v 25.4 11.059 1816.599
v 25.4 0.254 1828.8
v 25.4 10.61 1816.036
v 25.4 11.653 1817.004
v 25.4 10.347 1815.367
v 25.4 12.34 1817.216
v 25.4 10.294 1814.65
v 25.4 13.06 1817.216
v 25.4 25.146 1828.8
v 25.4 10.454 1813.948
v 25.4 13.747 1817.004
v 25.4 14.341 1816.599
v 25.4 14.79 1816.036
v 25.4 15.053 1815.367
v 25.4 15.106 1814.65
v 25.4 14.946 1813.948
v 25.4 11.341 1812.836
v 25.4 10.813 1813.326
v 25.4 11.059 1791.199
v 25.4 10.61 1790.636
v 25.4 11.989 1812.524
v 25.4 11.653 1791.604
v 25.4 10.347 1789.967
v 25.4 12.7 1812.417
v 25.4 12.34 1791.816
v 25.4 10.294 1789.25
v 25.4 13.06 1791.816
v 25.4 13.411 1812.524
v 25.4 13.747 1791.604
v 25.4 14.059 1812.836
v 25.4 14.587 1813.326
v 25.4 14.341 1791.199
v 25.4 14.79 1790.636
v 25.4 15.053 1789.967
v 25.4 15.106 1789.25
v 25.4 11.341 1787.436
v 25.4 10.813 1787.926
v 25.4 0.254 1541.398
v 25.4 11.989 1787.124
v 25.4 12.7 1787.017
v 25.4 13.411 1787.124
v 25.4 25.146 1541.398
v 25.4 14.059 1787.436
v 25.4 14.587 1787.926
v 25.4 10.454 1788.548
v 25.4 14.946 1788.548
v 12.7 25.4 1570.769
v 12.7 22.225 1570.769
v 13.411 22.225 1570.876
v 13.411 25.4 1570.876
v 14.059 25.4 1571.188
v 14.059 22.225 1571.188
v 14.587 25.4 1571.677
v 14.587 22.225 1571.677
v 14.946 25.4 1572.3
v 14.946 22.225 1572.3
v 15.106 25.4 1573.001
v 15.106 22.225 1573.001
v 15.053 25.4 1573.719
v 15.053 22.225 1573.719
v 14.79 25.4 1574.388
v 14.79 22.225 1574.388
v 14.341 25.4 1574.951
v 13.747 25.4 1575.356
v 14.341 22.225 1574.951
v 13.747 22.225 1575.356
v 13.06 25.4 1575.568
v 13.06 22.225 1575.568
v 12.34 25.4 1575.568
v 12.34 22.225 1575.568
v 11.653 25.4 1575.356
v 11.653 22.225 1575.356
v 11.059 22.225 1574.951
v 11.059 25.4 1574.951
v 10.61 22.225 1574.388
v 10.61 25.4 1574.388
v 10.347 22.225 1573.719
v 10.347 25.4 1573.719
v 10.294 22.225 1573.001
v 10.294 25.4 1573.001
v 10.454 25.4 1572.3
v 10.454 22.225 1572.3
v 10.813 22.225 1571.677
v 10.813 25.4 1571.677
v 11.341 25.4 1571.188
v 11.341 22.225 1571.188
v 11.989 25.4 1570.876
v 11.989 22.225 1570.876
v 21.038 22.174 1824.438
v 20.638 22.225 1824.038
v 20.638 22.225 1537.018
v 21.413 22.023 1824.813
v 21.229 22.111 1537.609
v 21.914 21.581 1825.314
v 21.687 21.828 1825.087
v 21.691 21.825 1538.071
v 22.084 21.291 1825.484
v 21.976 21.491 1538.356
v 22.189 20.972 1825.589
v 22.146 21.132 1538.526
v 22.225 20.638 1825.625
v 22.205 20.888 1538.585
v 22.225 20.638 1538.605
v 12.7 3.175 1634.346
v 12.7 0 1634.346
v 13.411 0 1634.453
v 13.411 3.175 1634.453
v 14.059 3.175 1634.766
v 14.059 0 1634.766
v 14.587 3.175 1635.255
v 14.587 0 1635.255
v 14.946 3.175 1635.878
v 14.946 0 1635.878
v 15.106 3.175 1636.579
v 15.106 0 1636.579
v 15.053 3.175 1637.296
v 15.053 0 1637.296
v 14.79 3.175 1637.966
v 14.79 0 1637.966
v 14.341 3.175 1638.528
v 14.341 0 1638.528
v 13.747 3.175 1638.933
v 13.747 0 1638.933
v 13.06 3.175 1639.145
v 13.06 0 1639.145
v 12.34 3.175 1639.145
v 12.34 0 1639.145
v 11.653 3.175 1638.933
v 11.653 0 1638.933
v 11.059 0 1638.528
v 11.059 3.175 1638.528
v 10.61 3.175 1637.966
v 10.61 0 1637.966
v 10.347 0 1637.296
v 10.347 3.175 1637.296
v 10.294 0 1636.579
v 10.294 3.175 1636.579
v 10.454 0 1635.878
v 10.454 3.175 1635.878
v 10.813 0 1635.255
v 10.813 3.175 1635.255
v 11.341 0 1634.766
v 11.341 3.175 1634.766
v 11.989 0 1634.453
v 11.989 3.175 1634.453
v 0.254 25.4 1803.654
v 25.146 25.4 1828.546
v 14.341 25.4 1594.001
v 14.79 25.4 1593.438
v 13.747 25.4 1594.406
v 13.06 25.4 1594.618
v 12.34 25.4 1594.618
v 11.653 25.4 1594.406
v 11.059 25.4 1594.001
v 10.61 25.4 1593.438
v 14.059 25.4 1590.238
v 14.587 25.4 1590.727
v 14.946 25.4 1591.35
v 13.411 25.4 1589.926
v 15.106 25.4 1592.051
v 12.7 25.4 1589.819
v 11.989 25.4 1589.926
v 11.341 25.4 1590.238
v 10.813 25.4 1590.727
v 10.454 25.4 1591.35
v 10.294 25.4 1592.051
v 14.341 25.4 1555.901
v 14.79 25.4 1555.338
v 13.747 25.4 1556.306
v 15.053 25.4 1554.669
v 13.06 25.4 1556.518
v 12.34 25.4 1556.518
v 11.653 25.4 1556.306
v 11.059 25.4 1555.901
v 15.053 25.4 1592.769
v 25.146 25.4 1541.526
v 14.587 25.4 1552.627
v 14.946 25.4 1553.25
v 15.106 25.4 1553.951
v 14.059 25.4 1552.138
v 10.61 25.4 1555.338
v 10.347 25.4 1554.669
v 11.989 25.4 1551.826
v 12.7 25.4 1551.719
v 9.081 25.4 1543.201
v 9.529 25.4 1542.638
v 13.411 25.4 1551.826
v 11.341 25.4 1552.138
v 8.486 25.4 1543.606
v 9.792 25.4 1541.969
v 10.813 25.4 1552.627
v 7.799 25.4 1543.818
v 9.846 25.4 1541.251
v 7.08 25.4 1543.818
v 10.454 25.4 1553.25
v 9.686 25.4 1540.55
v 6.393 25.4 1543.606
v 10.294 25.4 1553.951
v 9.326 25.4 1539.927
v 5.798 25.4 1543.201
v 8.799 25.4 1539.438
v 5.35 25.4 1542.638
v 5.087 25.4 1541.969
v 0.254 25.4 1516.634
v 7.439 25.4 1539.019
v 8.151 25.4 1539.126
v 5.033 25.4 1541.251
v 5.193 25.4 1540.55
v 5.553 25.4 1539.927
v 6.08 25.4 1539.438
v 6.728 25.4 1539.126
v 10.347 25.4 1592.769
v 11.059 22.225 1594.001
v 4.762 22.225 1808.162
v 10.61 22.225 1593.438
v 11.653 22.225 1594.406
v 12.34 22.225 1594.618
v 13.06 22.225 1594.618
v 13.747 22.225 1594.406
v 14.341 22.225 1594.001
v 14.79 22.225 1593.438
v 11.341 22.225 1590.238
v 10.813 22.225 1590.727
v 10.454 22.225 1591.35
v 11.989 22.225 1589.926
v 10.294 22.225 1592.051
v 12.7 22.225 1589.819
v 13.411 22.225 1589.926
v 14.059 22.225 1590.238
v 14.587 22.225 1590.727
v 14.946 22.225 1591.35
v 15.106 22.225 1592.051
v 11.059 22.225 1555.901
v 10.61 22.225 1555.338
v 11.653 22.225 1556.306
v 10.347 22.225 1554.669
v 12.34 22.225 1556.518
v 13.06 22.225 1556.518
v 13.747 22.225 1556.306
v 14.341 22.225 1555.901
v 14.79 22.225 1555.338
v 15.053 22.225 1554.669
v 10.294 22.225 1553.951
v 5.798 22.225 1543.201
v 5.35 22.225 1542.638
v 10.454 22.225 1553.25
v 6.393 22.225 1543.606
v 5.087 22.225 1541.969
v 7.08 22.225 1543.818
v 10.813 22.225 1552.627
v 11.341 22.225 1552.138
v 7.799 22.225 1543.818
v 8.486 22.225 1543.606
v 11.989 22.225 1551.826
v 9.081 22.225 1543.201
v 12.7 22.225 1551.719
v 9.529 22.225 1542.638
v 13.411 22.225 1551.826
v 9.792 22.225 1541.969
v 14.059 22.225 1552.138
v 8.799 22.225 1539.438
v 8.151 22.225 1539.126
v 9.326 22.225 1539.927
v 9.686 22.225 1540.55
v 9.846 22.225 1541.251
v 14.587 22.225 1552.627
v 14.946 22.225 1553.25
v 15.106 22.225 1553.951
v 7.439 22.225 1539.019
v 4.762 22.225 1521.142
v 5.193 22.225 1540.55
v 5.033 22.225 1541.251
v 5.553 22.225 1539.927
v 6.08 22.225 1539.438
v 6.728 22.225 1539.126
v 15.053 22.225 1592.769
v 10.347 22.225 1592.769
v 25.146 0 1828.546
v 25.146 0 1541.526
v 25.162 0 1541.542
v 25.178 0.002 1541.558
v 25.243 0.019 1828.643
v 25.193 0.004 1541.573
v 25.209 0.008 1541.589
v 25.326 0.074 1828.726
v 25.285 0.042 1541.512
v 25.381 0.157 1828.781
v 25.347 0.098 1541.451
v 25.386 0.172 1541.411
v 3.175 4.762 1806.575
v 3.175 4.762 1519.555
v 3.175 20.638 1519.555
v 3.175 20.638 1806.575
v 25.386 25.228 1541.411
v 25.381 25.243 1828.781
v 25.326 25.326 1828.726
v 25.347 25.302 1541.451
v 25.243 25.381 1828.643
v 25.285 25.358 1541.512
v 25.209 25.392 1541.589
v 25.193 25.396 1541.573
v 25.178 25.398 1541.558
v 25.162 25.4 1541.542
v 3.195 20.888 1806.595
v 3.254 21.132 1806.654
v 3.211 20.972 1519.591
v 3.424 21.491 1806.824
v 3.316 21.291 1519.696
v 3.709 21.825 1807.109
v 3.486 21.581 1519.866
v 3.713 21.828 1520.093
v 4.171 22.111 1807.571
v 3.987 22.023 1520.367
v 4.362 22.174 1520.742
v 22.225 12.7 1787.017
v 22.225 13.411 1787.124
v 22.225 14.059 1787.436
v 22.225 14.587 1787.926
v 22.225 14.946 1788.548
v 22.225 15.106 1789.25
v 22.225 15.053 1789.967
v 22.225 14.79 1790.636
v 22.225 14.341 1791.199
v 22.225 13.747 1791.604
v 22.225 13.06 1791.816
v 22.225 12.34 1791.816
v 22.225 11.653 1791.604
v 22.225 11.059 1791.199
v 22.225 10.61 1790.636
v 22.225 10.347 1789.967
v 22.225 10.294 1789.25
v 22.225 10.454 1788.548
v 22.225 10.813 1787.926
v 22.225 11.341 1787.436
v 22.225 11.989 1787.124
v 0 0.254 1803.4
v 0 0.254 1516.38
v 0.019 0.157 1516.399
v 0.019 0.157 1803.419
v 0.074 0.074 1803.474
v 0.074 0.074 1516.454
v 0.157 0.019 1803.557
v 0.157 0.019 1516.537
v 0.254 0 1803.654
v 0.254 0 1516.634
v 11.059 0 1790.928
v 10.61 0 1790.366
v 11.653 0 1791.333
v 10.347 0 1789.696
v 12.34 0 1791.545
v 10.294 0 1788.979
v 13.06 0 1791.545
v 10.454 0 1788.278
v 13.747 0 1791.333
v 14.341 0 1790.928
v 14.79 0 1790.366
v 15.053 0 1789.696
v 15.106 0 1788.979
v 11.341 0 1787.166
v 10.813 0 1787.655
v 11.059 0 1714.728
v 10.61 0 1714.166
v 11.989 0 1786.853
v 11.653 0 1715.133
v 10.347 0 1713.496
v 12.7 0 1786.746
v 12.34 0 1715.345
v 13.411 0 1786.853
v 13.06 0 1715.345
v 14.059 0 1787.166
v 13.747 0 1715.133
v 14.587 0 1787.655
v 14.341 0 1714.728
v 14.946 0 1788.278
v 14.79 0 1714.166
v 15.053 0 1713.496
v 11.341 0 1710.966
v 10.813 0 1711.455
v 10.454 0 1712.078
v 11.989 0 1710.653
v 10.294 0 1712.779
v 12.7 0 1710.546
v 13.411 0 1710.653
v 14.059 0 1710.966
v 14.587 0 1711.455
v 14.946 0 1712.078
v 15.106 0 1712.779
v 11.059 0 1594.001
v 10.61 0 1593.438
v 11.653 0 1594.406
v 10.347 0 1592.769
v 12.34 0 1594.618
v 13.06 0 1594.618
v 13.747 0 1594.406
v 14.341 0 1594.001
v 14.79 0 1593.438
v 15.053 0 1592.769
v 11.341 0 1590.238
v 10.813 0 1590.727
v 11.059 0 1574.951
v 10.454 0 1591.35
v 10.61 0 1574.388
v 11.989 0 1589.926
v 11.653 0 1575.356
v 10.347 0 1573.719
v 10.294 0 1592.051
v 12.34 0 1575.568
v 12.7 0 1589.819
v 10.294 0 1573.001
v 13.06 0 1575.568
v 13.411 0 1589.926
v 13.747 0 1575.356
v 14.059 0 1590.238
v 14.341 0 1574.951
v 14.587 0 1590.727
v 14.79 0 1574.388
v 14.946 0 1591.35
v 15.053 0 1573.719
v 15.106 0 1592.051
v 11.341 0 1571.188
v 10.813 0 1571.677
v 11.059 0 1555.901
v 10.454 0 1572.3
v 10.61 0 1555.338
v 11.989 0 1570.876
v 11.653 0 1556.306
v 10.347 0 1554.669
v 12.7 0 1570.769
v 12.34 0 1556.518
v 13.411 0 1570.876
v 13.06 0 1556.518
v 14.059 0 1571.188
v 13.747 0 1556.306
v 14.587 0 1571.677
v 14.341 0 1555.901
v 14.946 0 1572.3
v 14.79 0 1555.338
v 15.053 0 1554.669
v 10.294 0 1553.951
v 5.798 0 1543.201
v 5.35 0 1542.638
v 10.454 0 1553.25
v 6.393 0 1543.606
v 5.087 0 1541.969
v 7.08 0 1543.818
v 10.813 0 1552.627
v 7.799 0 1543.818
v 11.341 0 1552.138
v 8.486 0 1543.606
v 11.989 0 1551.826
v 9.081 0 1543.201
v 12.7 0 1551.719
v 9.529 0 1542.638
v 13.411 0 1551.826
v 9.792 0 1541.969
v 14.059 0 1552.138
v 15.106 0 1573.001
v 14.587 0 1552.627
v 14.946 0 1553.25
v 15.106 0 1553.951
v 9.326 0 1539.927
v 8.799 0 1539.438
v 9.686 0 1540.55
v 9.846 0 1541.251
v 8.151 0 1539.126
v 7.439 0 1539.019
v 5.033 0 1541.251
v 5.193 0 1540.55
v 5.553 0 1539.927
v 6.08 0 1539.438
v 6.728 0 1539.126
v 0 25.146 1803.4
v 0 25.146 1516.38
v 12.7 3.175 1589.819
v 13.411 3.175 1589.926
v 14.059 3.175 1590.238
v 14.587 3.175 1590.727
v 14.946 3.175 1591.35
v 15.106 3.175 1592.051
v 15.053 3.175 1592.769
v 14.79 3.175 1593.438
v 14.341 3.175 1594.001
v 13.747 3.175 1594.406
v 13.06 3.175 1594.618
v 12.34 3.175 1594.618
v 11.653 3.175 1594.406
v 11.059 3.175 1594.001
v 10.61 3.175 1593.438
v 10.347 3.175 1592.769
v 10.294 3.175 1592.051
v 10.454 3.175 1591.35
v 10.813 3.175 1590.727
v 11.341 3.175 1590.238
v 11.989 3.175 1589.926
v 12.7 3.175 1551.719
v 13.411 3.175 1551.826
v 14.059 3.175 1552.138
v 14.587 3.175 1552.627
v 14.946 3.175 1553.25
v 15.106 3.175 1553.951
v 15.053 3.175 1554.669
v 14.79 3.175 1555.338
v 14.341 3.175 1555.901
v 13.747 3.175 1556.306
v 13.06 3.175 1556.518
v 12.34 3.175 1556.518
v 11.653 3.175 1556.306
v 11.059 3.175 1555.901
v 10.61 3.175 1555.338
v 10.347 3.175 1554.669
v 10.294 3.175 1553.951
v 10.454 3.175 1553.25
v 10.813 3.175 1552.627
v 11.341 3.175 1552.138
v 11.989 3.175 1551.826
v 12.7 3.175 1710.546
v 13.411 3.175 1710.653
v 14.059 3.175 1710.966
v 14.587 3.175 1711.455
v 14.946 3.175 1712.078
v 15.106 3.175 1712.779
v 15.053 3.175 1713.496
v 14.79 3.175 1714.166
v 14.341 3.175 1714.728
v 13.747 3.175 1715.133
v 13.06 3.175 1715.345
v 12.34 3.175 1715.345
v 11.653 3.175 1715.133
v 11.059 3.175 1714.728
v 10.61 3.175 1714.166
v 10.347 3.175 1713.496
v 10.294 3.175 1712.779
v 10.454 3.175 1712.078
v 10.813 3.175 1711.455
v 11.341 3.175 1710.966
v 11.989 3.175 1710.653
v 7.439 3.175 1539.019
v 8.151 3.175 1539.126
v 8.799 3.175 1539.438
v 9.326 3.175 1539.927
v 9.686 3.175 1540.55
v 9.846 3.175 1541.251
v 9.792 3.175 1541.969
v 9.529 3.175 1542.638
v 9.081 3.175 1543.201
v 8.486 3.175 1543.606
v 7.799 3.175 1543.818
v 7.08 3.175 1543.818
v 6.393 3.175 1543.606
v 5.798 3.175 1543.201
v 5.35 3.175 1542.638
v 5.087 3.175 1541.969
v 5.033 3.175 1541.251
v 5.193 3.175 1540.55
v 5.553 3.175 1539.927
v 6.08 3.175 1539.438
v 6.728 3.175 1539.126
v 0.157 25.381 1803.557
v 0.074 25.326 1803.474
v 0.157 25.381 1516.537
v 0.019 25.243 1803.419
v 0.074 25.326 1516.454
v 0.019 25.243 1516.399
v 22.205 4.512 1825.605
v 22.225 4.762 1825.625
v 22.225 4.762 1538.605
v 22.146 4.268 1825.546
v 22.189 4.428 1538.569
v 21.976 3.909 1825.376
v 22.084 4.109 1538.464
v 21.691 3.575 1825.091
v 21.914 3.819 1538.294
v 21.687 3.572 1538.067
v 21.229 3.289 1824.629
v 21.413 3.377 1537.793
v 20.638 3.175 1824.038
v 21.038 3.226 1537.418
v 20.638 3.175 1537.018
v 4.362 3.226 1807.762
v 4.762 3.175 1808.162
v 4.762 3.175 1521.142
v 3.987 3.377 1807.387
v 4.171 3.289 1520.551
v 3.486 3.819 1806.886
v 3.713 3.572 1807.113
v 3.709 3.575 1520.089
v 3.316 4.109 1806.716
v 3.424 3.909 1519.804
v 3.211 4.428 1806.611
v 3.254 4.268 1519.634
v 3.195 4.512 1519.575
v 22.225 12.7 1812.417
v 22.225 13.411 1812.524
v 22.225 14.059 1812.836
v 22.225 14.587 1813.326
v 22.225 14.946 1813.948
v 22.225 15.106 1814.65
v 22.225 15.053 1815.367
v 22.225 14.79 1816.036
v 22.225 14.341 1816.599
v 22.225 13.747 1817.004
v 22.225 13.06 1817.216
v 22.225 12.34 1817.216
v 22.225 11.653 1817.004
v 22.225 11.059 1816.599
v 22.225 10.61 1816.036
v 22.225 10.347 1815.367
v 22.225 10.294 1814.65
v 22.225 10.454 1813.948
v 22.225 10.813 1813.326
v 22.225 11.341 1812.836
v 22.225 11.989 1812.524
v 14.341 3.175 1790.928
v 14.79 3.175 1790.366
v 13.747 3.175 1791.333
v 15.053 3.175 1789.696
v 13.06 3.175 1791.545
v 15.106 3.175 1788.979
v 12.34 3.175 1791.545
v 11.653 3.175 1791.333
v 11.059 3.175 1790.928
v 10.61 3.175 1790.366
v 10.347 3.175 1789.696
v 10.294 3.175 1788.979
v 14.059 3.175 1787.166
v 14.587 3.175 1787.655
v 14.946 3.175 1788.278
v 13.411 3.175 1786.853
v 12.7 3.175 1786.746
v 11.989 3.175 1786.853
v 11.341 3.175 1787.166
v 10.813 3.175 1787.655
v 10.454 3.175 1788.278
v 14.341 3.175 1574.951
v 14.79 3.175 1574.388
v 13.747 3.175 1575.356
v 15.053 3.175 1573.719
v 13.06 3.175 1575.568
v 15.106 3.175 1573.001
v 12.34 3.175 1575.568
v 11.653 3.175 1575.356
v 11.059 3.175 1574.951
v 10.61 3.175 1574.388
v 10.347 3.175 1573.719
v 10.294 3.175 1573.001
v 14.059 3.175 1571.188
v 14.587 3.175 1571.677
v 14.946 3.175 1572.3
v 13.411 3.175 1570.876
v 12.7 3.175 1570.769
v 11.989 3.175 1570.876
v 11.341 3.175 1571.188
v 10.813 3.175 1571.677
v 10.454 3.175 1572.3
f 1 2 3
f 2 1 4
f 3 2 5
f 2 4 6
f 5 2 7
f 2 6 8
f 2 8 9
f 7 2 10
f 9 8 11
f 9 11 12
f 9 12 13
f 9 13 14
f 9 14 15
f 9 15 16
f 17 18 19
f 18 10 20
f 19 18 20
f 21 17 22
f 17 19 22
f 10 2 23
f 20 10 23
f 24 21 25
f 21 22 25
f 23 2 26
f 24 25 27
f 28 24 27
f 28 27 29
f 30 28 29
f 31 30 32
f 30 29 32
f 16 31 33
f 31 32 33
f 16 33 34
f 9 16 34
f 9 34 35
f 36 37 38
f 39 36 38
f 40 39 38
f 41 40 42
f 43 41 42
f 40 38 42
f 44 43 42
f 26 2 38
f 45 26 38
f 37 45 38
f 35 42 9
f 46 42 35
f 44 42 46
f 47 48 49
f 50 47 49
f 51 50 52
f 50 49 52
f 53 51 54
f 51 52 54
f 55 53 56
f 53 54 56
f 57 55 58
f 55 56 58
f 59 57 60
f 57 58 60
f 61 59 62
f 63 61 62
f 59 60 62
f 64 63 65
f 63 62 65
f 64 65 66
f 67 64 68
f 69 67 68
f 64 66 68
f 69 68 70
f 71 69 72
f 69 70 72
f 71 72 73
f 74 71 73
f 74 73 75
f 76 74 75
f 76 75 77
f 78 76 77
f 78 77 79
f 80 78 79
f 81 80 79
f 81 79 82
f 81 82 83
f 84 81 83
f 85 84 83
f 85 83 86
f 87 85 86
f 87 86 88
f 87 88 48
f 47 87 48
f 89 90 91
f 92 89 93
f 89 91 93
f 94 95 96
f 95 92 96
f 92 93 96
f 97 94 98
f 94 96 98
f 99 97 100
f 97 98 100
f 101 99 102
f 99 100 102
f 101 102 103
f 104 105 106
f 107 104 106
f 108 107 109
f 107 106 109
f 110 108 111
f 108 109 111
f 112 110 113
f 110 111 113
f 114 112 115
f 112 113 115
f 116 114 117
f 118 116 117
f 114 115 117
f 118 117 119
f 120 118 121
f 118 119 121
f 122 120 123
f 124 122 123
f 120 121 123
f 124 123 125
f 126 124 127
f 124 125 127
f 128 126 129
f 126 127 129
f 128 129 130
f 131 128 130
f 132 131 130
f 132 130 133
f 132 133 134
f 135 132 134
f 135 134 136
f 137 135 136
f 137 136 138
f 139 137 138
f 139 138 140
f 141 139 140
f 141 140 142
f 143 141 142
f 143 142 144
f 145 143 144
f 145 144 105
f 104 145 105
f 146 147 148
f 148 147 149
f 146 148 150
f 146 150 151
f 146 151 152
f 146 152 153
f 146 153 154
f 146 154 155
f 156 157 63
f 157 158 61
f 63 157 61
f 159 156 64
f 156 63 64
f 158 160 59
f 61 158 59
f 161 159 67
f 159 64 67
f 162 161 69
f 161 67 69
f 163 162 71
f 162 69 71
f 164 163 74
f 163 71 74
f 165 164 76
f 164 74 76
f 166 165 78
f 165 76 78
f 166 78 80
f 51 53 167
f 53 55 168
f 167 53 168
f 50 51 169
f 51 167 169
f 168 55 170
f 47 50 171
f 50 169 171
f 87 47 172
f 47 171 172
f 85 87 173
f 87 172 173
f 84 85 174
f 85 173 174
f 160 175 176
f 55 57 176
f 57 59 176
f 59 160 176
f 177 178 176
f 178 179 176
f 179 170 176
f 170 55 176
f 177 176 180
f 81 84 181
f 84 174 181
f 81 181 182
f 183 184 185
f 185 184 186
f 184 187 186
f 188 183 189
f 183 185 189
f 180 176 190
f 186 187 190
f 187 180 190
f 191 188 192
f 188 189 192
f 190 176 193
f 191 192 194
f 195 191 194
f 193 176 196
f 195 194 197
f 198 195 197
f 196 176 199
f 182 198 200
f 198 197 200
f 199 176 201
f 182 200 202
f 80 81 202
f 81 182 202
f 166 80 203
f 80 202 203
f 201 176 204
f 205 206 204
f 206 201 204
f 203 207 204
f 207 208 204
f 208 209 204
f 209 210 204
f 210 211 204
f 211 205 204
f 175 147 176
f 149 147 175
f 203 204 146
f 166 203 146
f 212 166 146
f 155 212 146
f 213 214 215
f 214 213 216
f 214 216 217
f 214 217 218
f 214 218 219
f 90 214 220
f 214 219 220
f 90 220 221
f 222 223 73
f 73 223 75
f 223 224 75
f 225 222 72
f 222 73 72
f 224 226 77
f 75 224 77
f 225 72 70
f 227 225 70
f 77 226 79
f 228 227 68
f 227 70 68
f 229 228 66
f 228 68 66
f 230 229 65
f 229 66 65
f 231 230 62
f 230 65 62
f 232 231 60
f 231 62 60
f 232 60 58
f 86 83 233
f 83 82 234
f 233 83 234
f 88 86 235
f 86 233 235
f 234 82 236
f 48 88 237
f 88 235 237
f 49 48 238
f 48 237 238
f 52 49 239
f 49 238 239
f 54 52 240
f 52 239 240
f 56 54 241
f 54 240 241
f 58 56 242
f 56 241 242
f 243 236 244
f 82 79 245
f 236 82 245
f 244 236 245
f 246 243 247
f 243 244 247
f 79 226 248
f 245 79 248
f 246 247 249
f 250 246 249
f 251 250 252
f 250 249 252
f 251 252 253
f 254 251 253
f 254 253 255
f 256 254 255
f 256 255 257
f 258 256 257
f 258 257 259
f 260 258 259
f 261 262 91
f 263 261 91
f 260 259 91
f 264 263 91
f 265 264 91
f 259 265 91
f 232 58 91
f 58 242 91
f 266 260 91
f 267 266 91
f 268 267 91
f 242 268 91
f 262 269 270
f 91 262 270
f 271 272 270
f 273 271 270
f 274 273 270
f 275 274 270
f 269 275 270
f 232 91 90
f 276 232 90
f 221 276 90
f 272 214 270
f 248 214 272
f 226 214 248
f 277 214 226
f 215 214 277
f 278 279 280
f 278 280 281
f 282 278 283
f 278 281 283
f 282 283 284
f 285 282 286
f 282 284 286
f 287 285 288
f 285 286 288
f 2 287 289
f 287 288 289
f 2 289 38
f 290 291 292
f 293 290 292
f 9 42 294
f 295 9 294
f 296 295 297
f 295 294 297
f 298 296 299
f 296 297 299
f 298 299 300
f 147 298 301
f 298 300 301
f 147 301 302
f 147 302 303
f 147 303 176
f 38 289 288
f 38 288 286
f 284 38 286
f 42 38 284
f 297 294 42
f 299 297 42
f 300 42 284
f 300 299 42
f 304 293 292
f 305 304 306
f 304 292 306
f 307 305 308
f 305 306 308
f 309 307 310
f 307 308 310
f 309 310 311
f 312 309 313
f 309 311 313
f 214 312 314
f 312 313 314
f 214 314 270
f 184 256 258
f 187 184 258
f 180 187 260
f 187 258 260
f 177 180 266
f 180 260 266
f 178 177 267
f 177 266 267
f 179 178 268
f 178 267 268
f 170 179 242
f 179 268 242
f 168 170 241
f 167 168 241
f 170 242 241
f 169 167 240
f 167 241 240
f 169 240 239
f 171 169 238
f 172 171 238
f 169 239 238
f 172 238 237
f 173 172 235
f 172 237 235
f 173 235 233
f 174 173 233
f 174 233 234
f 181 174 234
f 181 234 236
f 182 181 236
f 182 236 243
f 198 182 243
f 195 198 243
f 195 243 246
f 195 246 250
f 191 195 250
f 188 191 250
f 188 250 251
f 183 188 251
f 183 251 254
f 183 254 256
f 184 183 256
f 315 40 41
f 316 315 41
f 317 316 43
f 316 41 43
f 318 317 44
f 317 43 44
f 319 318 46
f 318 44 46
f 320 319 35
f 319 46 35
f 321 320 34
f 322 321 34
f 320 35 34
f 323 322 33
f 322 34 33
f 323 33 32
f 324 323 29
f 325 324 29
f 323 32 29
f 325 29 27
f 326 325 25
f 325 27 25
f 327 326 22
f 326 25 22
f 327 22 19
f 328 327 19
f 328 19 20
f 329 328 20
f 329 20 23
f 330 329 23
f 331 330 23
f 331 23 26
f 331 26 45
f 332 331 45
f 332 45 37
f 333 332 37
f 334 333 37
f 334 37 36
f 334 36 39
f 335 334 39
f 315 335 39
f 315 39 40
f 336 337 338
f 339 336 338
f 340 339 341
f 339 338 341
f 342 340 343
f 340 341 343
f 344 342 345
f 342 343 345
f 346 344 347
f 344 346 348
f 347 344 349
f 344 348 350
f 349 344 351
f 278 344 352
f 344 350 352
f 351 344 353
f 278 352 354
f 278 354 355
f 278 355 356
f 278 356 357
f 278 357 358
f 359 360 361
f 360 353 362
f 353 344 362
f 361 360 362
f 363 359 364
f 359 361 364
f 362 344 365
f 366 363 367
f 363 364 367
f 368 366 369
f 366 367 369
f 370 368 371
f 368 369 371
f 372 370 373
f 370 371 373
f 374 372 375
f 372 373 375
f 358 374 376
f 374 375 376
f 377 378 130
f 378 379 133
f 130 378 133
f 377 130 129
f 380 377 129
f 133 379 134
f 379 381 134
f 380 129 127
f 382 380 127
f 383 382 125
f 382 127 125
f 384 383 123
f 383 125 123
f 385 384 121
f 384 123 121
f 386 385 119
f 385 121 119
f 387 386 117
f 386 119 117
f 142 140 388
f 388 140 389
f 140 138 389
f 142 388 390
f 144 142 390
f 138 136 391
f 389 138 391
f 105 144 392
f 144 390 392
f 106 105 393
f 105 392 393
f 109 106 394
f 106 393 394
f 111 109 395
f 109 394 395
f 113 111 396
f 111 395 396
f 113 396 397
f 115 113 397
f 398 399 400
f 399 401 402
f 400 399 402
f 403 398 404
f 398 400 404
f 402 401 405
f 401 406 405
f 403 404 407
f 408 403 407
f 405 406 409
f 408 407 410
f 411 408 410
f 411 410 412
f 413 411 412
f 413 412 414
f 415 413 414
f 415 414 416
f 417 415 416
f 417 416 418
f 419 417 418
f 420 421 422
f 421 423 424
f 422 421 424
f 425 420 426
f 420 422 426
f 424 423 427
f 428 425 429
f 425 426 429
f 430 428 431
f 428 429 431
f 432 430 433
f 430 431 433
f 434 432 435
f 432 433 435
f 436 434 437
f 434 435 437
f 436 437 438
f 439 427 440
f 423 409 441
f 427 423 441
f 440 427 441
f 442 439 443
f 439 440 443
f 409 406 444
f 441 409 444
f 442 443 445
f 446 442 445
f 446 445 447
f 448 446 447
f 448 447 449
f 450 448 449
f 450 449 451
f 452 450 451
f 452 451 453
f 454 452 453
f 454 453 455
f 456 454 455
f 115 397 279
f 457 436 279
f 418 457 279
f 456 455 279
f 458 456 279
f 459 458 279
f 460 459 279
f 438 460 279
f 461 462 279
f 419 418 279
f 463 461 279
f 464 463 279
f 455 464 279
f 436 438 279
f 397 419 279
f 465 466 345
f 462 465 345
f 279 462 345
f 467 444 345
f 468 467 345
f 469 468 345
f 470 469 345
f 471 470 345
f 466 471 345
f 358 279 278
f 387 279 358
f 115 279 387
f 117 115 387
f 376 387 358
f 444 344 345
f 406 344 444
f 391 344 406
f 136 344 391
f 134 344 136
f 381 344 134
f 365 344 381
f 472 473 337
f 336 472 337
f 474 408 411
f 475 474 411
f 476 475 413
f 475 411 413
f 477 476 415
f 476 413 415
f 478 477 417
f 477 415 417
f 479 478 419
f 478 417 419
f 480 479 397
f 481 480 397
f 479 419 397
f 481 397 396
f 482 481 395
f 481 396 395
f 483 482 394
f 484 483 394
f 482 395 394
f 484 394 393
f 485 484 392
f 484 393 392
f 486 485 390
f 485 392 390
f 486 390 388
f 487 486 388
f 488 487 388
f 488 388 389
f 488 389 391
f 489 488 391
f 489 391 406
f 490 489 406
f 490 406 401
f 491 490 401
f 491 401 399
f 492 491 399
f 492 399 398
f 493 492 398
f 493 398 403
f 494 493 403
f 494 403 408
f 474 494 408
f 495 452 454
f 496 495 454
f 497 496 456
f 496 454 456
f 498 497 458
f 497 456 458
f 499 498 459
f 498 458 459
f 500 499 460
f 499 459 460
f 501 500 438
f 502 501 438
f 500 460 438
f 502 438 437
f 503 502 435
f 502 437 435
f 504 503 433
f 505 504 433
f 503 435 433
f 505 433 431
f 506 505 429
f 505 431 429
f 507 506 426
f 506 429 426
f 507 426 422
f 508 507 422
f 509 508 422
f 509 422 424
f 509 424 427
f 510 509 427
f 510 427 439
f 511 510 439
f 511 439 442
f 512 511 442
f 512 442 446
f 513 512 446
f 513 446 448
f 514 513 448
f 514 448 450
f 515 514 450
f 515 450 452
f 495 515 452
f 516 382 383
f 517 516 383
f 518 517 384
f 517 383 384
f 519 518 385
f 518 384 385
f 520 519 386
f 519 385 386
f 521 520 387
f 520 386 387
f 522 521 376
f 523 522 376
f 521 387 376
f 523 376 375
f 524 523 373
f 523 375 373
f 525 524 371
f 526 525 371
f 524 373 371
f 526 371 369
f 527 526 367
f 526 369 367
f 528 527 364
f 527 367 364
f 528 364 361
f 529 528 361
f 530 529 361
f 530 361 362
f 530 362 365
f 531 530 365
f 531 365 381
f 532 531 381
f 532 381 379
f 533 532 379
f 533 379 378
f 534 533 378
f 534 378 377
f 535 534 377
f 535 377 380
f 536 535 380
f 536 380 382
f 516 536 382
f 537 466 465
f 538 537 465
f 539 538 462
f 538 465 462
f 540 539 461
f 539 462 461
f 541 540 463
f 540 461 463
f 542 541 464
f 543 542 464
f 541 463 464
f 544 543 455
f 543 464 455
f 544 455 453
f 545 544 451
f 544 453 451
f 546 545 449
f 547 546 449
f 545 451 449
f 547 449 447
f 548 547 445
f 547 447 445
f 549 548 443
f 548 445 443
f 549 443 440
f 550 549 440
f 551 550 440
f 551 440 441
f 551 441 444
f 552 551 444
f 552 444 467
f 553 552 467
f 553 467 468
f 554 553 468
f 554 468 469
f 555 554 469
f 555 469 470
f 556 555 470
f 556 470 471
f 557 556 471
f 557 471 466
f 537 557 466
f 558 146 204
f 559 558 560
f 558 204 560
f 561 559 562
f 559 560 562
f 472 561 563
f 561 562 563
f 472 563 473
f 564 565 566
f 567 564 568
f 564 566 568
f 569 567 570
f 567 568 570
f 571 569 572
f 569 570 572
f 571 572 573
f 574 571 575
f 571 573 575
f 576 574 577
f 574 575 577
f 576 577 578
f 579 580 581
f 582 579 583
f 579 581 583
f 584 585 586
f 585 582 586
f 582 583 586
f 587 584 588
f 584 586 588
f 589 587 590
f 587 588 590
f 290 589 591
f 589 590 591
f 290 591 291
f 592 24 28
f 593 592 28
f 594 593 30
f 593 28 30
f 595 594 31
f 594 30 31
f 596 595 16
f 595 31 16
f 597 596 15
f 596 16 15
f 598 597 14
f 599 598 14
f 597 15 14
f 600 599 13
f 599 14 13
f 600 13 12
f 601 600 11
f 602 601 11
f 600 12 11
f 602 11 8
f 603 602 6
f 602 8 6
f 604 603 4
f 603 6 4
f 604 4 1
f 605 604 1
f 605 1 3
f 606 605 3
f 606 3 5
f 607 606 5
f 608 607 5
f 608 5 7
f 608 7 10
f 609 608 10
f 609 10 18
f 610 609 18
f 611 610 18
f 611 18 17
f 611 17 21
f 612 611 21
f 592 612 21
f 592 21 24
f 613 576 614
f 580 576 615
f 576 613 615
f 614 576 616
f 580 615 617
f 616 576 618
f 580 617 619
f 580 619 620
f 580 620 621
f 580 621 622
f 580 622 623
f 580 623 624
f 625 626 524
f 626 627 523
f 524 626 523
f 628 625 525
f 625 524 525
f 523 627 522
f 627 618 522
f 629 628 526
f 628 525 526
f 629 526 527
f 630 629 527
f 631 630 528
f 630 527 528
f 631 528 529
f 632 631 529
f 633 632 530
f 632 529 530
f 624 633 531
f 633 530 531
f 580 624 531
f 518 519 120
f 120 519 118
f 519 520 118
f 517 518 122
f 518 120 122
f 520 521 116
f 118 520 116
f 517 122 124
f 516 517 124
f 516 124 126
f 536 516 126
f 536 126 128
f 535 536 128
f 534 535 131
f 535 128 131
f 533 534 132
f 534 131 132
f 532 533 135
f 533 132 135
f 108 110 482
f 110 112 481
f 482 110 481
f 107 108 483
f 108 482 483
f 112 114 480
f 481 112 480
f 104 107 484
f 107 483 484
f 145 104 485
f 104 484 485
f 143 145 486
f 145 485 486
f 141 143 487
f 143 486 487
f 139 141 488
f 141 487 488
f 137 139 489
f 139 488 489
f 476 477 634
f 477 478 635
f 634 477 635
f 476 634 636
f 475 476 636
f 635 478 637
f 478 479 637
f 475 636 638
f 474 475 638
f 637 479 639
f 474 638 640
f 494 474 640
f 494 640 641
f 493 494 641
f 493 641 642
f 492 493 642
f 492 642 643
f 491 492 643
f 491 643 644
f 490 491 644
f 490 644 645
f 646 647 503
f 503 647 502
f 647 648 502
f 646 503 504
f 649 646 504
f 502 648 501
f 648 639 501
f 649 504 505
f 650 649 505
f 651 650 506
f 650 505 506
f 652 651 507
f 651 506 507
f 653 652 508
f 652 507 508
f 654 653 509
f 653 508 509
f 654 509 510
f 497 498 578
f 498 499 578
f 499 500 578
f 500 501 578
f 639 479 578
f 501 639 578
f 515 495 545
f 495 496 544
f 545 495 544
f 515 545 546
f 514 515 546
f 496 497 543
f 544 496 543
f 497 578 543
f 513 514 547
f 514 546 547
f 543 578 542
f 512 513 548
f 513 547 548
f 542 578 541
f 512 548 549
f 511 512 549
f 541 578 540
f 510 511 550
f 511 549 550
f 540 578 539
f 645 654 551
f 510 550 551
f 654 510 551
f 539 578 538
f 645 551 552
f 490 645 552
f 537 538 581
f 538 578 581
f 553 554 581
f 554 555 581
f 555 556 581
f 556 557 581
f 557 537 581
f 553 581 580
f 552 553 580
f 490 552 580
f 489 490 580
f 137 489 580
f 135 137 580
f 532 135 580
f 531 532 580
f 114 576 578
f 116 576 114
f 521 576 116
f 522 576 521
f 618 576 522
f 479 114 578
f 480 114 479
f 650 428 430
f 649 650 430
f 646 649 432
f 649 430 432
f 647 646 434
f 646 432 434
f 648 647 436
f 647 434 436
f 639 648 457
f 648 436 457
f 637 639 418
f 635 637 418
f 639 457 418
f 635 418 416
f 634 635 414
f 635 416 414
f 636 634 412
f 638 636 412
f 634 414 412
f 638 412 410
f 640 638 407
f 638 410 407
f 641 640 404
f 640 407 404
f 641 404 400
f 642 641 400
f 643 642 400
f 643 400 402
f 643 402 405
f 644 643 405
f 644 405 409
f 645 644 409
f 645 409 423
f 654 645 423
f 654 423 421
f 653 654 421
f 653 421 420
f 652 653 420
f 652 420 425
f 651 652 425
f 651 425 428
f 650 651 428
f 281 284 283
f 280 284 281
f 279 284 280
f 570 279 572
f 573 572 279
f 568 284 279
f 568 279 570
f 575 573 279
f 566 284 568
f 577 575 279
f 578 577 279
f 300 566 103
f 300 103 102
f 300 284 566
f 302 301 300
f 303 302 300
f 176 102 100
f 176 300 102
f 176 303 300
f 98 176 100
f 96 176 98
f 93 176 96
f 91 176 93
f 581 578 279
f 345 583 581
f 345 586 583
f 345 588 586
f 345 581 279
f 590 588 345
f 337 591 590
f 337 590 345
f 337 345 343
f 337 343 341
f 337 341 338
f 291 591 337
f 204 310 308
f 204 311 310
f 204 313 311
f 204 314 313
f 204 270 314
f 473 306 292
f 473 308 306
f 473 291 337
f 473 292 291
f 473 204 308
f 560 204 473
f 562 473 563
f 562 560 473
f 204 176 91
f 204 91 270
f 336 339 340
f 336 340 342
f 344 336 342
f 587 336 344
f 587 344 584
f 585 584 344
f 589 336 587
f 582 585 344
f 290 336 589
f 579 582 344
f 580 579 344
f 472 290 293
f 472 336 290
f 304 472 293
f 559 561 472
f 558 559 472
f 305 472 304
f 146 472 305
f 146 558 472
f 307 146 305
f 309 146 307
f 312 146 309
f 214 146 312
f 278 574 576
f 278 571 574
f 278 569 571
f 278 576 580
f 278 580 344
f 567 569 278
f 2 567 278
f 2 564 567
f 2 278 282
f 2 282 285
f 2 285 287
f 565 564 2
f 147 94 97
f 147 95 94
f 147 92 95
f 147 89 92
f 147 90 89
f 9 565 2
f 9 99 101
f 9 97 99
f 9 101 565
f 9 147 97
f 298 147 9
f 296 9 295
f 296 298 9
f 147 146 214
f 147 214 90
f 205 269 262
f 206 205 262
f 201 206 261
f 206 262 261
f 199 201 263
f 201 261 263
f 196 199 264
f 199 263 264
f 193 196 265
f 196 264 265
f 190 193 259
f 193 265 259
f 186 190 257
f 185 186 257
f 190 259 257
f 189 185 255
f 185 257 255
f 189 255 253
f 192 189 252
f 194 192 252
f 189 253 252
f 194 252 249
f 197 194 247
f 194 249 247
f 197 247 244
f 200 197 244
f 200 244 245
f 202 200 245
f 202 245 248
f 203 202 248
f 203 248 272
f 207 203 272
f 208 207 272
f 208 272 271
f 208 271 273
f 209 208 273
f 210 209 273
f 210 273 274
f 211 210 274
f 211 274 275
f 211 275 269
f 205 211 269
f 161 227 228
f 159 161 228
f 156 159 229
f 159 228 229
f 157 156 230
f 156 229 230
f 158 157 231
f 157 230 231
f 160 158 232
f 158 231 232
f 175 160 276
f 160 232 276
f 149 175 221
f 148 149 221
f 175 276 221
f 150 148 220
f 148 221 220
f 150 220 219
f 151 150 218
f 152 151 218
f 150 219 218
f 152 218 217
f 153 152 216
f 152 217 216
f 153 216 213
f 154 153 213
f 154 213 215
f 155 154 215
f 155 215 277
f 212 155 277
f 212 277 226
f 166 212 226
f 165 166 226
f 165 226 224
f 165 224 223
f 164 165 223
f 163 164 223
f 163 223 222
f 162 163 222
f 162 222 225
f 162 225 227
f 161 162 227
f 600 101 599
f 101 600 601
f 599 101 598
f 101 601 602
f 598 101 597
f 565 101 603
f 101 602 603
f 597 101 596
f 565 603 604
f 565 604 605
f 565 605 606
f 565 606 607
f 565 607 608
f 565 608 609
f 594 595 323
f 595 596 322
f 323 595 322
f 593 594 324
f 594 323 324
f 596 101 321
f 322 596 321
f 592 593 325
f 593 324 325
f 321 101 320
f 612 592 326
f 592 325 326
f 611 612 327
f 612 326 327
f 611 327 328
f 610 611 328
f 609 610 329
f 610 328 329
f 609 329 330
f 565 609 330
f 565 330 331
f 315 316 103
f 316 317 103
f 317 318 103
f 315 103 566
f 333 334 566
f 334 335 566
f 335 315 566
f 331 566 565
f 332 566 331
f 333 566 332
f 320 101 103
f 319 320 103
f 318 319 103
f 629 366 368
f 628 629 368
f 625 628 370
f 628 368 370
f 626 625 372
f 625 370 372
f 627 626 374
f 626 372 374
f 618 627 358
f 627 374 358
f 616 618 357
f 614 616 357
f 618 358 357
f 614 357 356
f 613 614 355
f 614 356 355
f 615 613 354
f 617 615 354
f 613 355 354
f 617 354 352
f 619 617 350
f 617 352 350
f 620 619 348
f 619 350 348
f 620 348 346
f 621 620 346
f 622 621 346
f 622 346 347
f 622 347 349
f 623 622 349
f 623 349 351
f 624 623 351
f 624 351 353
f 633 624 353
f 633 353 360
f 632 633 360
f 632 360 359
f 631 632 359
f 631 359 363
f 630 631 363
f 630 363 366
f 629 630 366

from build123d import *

# Parameters (mm, degrees)
CUT_EXTRUDE1_START = 1516.38
CUT_EXTRUDE1_DEPTH = 312.42
CUT_EXTRUDE2_REACH = 1831.153
CUT_EXTRUDE3_REACH = 1831.153
SKETCH5_R          = 2.413
CUT_EXTRUDE5_DEPTH = 1830.152743759
CUT_EXTRUDE7_REACH = 1831.153
SKETCH8_R          = 2.413
CUT_EXTRUDE8_REACH = 1831.153
SKETCH9_R          = 2.413


with BuildPart() as part:
    # Cut-Extrude1: read off the stored shape, not the designer's step
    # Cut-Extrude1 outline → Cut-Extrude1 (new body)
    with BuildSketch(Plane.XY.offset(CUT_EXTRUDE1_START)):
        with BuildLine():
            Line((0, 25.146), (0, 0.254))
            ThreePointArc((0, 0.254), (0.074394878, 0.074394878), (0.254, 0))
            Line((0.254, 0), (25.146, 0))
            ThreePointArc((25.146, 0), (25.325605122, 0.074394878), (25.4, 0.254))
            Line((25.4, 0.254), (25.4, 25.146))
            ThreePointArc((25.4, 25.146), (25.325605122, 25.325605122), (25.146, 25.4))
            Line((25.146, 25.4), (0.254, 25.4))
            ThreePointArc((0.254, 25.4), (0.074394878, 25.325605122), (0, 25.146))
        make_face()
        with BuildLine():
            ThreePointArc((4.7625, 3.175), (3.639967985, 3.639967985), (3.175, 4.7625))
            Line((3.175, 4.7625), (3.175, 20.6375))
            ThreePointArc((3.175, 20.6375), (3.639967985, 21.760032015), (4.7625, 22.225))
            Line((4.7625, 22.225), (20.6375, 22.225))
            ThreePointArc((20.6375, 22.225), (21.760032015, 21.760032015), (22.225, 20.6375))
            Line((22.225, 20.6375), (22.225, 4.7625))
            ThreePointArc((22.225, 4.7625), (21.760032015, 3.639967985), (20.6375, 3.175))
            Line((20.6375, 3.175), (4.7625, 3.175))
        make_face(mode=Mode.SUBTRACT)
    extrude(amount=CUT_EXTRUDE1_DEPTH)

    # Cut-Extrude2: up to this face of the body (flat: up to its plane)
    cut_extrude2_end = Plane(part.part.faces().sort_by_distance((12.7, 0, 1672.59))[0])
    # Sketch2 → Cut-Extrude2 (cut, up to the picked face)
    with BuildSketch(Plane(origin=(0, 25.4, 0), x_dir=(1, 0, 0), z_dir=(0, 1, 0)), mode=Mode.PRIVATE) as cut_extrude2_sk1:
        Polygon((43.169380192, -1523.628355708), (25.20886795, -1541.58886795), (-10.712156534, -1505.667843466), (7.248355708, -1487.707331224), align=None)
    cut_extrude2_tool1 = split(extrude(cut_extrude2_sk1.sketch, amount=-CUT_EXTRUDE2_REACH, mode=Mode.PRIVATE), bisect_by=cut_extrude2_end, keep=Keep.BOTH, mode=Mode.PRIVATE)
    add(cut_extrude2_tool1.solids().sort_by(Axis((16.228612, 25.4, 1514.6481), (0, -1, 0)))[0], mode=Mode.SUBTRACT)

    # Cut-Extrude3: up to this face of the body (flat: up to its plane)
    cut_extrude3_end = Plane(part.part.faces().sort_by_distance((12.527724859, 0, 1678.853862429))[0])
    # Sketch3 → Cut-Extrude3 (cut, up to the picked face)
    with BuildSketch(Plane(origin=(0, 25.4, 0), x_dir=(1, 0, 0), z_dir=(0, 1, 0)), mode=Mode.PRIVATE) as cut_extrude3_sk1:
        Polygon((34.192766306, -1837.592766306), (16.232254064, -1855.553278548), (-19.688770421, -1819.632254064), (-1.728258178, -1801.671741822), align=None)
    cut_extrude3_tool1 = split(extrude(cut_extrude3_sk1.sketch, amount=-CUT_EXTRUDE3_REACH, mode=Mode.PRIVATE), bisect_by=cut_extrude3_end, keep=Keep.BOTH, mode=Mode.PRIVATE)
    add(cut_extrude3_tool1.solids().sort_by(Axis((7.251998, 25.4, 1828.61251), (0, -1, 0)))[0], mode=Mode.SUBTRACT)

    # Sketch5 → Cut-Extrude5 (cut, through all)
    with BuildSketch(Plane.XZ):
        with Locations(Location((7.439487758, 1541.431804126, 0), (0, 0, 270))):
            Circle(SKETCH5_R)
        with Locations(Location((12.7, 1554.131804126, 0), (0, 0, 270))):
            Circle(SKETCH5_R)
        with Locations(Location((12.7, 1573.181804126, 0), (0, 0, 270))):
            Circle(SKETCH5_R)
        with Locations(Location((12.7, 1592.231804126, 0), (0, 0, 270))):
            Circle(SKETCH5_R)
    extrude(amount=-CUT_EXTRUDE5_DEPTH, mode=Mode.SUBTRACT)

    # Sketch8 → Cut-Extrude7 (cut, up to next)
    with BuildSketch(Plane(origin=(25.4, 0, 0), x_dir=(0, 0, -1), z_dir=(1, 0, 0)), mode=Mode.PRIVATE) as cut_extrude7_sk1:
        with Locations((-1814.83, 12.7)):
            Circle(SKETCH8_R)
    cut_extrude7_tool1 = extrude(cut_extrude7_sk1.sketch, amount=-CUT_EXTRUDE7_REACH, mode=Mode.PRIVATE) & part.part
    # Sketch8 → Cut-Extrude7 (cut, up to next)
    with BuildSketch(Plane(origin=(25.4, 0, 0), x_dir=(0, 0, -1), z_dir=(1, 0, 0)), mode=Mode.PRIVATE) as cut_extrude7_sk2:
        with Locations((-1789.43, 12.7)):
            Circle(SKETCH8_R)
    cut_extrude7_tool2 = extrude(cut_extrude7_sk2.sketch, amount=-CUT_EXTRUDE7_REACH, mode=Mode.PRIVATE) & part.part
    add(cut_extrude7_tool1.solids().sort_by_distance((25.4, 12.7, 1814.83))[0], mode=Mode.SUBTRACT)
    add(cut_extrude7_tool2.solids().sort_by_distance((25.4, 12.7, 1789.43))[0], mode=Mode.SUBTRACT)

    # Sketch9 → Cut-Extrude8 (cut, up to next)
    with BuildSketch(Plane.XZ, mode=Mode.PRIVATE) as cut_extrude8_sk1:
        with Locations(Location((12.7, 1789.159231637, 0), (0, 0, 270))):
            Circle(SKETCH9_R)
    cut_extrude8_tool1 = extrude(cut_extrude8_sk1.sketch, amount=-CUT_EXTRUDE8_REACH, mode=Mode.PRIVATE) & part.part
    # Sketch9 → Cut-Extrude8 (cut, up to next)
    with BuildSketch(Plane.XZ, mode=Mode.PRIVATE) as cut_extrude8_sk2:
        with Locations(Location((12.7, 1712.959231637, 0), (0, 0, 270))):
            Circle(SKETCH9_R)
    cut_extrude8_tool2 = extrude(cut_extrude8_sk2.sketch, amount=-CUT_EXTRUDE8_REACH, mode=Mode.PRIVATE) & part.part
    # Sketch9 → Cut-Extrude8 (cut, up to next)
    with BuildSketch(Plane.XZ, mode=Mode.PRIVATE) as cut_extrude8_sk3:
        with Locations(Location((12.7, 1636.759231637, 0), (0, 0, 270))):
            Circle(SKETCH9_R)
    cut_extrude8_tool3 = extrude(cut_extrude8_sk3.sketch, amount=-CUT_EXTRUDE8_REACH, mode=Mode.PRIVATE) & part.part
    add(cut_extrude8_tool1.solids().sort_by_distance((12.7, 0, 1789.159232))[0], mode=Mode.SUBTRACT)
    add(cut_extrude8_tool2.solids().sort_by_distance((12.7, 0, 1712.959232))[0], mode=Mode.SUBTRACT)
    add(cut_extrude8_tool3.solids().sort_by_distance((12.7, 0, 1636.759232))[0], mode=Mode.SUBTRACT)


solid = part.part
